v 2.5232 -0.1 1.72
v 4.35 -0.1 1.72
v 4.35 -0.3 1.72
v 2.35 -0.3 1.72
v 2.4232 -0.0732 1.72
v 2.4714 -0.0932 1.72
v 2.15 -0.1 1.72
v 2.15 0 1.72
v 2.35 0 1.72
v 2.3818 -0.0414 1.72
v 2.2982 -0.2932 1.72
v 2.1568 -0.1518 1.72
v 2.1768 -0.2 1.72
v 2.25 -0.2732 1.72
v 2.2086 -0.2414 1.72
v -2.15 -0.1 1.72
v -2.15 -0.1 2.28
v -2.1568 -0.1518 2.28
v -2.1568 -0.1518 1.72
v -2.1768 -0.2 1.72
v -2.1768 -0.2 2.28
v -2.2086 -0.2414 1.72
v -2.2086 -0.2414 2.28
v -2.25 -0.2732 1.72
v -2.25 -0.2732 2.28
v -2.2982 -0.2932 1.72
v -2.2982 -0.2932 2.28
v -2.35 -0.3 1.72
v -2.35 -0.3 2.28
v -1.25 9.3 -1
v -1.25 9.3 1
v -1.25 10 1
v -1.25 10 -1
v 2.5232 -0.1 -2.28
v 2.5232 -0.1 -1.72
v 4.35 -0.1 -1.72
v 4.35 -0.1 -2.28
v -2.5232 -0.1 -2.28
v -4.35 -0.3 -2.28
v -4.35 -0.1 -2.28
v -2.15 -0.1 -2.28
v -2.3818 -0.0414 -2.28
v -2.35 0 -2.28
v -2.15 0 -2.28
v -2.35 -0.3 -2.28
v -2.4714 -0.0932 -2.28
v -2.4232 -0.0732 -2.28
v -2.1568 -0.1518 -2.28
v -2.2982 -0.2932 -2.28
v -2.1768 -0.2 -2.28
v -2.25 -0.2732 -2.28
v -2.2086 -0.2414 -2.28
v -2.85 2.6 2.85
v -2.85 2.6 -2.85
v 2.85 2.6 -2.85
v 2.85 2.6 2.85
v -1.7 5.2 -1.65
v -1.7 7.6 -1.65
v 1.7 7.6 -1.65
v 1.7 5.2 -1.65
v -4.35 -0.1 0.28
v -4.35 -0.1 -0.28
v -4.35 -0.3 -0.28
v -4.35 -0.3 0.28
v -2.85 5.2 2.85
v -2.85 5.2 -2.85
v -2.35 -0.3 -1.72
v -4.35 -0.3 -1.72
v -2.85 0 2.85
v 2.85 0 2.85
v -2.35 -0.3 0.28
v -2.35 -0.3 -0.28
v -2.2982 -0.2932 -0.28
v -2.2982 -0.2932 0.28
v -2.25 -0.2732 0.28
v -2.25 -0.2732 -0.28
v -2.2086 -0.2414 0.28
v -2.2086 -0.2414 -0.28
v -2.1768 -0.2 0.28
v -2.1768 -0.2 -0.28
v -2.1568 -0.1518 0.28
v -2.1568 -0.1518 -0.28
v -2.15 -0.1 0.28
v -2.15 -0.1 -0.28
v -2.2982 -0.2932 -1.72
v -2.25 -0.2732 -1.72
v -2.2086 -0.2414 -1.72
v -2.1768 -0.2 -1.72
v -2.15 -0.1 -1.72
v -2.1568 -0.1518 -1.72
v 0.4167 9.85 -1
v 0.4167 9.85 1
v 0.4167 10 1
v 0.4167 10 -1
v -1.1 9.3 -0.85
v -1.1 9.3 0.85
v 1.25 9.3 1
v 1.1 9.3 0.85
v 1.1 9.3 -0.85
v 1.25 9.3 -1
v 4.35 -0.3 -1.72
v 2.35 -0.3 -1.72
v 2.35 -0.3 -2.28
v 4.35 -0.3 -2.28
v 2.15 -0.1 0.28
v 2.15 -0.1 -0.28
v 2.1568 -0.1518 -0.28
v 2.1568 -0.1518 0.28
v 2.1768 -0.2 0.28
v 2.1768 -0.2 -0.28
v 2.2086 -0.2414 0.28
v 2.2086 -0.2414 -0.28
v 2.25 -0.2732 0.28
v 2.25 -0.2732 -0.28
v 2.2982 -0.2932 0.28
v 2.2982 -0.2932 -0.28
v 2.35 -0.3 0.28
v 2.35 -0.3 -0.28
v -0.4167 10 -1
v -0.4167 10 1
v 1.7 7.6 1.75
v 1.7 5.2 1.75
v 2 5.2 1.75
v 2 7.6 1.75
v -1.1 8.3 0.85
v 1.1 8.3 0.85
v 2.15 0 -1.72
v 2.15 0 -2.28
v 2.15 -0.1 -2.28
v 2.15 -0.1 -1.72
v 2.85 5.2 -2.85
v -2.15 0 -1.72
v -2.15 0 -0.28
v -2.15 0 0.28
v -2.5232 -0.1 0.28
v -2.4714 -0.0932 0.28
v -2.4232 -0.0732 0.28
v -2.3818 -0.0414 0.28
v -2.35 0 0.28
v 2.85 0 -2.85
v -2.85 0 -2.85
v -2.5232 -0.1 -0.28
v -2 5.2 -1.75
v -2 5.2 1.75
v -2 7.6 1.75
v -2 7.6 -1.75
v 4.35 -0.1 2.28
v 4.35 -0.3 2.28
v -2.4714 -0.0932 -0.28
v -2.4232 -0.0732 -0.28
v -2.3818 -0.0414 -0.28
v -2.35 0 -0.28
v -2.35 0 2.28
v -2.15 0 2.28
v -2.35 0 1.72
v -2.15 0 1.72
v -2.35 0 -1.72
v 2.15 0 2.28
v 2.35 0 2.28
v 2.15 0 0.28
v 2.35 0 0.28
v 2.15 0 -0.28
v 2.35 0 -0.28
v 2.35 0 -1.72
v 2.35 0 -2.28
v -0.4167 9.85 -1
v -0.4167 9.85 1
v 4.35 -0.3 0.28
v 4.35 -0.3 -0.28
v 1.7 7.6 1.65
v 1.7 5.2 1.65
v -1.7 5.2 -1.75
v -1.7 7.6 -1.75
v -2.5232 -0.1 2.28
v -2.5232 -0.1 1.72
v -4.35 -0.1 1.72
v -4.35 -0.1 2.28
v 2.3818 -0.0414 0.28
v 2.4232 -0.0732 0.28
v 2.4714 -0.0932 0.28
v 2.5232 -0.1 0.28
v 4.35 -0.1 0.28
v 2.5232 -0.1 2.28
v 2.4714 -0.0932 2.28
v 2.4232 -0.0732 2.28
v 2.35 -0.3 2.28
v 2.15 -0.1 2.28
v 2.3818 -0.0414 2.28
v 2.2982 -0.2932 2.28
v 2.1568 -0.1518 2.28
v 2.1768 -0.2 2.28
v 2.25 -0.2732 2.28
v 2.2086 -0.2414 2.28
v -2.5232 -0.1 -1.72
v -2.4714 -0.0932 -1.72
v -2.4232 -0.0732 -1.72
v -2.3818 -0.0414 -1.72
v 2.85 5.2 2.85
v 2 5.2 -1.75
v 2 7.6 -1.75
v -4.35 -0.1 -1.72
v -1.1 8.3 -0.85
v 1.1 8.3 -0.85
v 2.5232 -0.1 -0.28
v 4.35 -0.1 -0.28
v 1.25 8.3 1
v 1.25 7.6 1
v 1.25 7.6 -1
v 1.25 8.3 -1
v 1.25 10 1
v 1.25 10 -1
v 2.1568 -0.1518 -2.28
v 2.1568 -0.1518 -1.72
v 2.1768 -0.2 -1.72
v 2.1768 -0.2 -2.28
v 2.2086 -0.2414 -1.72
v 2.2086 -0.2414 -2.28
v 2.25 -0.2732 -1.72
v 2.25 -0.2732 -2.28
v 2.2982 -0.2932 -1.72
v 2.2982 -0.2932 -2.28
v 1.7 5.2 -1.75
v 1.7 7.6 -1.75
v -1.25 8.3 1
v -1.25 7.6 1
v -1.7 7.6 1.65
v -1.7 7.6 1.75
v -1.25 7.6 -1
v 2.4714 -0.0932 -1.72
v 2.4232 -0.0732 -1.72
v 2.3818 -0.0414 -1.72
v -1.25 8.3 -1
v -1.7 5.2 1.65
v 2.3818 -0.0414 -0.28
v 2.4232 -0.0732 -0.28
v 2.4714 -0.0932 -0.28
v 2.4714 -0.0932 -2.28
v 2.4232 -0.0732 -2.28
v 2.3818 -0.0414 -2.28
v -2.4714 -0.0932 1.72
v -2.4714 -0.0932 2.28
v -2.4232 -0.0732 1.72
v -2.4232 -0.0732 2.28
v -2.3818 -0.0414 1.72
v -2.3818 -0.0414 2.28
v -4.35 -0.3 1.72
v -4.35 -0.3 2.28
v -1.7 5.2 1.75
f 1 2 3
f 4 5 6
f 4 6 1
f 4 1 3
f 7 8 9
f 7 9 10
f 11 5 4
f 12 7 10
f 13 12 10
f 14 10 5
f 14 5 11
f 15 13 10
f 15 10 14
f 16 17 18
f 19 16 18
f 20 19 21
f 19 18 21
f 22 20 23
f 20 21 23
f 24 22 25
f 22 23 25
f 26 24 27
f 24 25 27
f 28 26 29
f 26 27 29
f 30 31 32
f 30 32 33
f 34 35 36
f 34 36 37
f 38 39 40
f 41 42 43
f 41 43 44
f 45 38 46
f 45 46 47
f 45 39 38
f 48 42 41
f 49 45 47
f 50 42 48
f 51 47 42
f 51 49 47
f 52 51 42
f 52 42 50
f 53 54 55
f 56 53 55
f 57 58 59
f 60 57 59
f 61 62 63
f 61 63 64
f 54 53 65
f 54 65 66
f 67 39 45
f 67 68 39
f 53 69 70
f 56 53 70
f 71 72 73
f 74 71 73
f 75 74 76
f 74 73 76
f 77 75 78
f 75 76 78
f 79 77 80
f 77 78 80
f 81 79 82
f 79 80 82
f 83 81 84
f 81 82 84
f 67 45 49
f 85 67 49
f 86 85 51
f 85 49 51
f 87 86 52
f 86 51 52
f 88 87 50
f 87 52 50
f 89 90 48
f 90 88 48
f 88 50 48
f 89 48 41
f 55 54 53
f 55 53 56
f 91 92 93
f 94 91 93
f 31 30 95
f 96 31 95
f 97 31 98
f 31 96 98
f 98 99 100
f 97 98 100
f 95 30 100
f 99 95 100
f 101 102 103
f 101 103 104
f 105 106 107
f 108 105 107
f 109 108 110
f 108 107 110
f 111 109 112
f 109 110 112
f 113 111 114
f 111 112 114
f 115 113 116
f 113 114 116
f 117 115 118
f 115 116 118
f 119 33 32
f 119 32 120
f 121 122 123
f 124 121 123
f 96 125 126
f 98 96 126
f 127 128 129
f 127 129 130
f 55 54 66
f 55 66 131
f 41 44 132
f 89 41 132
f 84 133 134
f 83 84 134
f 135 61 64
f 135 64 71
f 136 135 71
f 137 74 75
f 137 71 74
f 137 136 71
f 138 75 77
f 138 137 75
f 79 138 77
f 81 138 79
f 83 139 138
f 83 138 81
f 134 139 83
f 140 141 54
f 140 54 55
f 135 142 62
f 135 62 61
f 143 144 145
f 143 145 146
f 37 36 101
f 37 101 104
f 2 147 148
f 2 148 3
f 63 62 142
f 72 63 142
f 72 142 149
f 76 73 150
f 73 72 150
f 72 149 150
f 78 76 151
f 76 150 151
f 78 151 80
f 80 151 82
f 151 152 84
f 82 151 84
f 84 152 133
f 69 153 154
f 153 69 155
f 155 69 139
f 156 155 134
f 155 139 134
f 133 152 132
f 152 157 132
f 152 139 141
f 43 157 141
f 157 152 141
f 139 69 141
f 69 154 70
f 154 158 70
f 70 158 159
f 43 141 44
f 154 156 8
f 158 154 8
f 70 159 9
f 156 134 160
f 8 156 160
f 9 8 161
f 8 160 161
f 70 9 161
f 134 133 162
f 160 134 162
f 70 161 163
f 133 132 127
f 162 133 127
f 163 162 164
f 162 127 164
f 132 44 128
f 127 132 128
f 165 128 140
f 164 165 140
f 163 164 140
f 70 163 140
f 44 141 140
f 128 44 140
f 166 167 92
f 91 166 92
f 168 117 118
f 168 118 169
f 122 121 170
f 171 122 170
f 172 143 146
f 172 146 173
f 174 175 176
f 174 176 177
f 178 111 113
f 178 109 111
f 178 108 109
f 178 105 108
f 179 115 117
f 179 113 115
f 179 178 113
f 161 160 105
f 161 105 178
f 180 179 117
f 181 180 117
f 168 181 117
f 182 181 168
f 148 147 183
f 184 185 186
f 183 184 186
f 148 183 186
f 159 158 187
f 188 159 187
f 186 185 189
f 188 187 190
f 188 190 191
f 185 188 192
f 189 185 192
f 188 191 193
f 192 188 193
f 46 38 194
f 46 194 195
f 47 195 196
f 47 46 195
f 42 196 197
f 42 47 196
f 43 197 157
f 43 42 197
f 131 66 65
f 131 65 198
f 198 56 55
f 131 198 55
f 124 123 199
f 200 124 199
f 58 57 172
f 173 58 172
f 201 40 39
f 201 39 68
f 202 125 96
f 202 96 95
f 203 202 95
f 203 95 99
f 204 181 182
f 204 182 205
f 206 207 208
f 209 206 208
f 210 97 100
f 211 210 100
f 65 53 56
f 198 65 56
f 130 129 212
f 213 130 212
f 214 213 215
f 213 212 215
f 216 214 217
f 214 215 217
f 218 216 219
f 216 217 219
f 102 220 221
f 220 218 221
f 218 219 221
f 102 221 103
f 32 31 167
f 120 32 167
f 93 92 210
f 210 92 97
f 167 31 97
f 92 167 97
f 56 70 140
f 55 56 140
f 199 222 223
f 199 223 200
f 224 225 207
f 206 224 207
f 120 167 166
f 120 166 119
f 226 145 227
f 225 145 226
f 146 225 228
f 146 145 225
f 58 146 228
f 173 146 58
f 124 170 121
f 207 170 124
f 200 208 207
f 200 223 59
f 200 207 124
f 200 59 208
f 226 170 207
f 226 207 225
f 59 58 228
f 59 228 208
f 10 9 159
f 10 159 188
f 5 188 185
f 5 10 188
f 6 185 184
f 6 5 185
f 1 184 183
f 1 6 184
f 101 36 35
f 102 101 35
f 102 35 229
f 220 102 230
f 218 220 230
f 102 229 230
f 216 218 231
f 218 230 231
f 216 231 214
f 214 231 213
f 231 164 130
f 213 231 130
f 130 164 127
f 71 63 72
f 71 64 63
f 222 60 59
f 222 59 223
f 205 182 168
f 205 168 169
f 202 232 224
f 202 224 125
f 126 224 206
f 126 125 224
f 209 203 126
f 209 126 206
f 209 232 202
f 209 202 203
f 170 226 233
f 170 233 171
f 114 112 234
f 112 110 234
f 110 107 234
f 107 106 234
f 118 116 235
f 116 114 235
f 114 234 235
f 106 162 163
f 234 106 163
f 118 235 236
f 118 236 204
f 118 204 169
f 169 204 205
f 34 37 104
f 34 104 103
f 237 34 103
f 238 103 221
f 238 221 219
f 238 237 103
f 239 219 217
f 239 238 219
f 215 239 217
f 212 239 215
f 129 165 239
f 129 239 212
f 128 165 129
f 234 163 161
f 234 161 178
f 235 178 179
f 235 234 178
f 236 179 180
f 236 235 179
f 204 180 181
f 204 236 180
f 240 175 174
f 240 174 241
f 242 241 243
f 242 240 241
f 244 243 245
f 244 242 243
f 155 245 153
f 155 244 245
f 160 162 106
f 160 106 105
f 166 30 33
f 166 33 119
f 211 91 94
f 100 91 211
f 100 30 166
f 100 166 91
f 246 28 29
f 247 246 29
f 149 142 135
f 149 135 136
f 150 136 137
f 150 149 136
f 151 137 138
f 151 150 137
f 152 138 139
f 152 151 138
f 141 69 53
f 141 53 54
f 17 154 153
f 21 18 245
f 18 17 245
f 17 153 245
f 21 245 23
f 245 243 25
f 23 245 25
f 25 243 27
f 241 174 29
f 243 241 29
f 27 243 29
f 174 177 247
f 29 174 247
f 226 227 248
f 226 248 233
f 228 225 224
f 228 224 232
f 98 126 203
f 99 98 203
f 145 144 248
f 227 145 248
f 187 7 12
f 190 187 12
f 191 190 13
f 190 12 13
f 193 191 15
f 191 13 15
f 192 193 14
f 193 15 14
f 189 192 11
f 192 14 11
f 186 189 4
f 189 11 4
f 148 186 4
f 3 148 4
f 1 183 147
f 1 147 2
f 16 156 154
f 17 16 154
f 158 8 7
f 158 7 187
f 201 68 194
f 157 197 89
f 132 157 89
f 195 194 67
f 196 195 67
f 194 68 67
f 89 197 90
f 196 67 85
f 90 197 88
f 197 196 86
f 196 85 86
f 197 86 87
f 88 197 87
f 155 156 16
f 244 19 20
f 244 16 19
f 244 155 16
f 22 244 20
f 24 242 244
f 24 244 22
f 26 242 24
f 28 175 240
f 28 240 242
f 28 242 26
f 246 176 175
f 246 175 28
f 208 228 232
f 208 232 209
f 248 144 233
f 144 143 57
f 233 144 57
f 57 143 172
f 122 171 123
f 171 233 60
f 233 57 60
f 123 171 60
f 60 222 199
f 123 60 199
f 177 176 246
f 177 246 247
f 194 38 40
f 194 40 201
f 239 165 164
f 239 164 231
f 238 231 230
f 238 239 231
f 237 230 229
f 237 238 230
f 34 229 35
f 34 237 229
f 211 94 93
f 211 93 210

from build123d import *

# Parameters (mm, degrees)
SKETCH_1_W                     = 5.7
SKETCH_1_H                     = 5.7
EXTRUDE_1_DEPTH                = 5.2
SPLIT_BODIES_1_SURFACE_1_BACK  = 10.593
SPLIT_BODIES_1_SURFACE_1_DEPTH = 21.186
SPLIT_BODIES_1_SURFACE_2_BACK  = 10.593
SPLIT_BODIES_1_SURFACE_2_DEPTH = 21.186
SKETCH_3_W                     = 4
SKETCH_3_H                     = 3.5
EXTRUDE_2_DEPTH                = 2.4
EXTRUDE_START                  = 2.4
SKETCH_3_3_W                   = 2.5
SKETCH_3_3_H                   = 2
EXTRUDE_3_DEPTH                = 2.4
SKETCH_4_W                     = 0.833333334
SKETCH_4_H                     = 0.3
CUT_EXTRUDE_1_DEPTH            = 12.088056638
SWEEP_START                    = 8.3
SWEEP_1_OUTLINE_W              = 2.5
SWEEP_1_OUTLINE_H              = 2
SWEEP_1_OUTLINE_W_2            = 2.2
SWEEP_1_OUTLINE_H_2            = 1.7
SWEEP_1_DEPTH                  = 1
SKETCH_10_W                    = 3.4
SKETCH_10_H                    = 0.2
CUT_EXTRUDE_2_DEPTH            = 2.4
SKETCH_14_W                    = 0.2
SKETCH_14_H                    = 0.56
EXTRUDE_5_DEPTH                = 0.3
SKETCH_15_W                    = 0.56
SKETCH_15_H                    = 0.2
EXTRUDE_6_DEPTH                = 2
SKETCH_16_W                    = 0.56
SKETCH_16_H                    = 0.2
EXTRUDE_7_DEPTH                = 2
FILLET_1_R                     = 0.2


with BuildPart() as part:
    # Эскиз1 → Бобышка-Вытянуть1 (new body)
    with BuildSketch(Plane(origin=(0, 0, 0), x_dir=(1, 0, 0), z_dir=(0, 1, 0))):
        Rectangle(SKETCH_1_W, SKETCH_1_H)
    extrude(amount=EXTRUDE_1_DEPTH)


with BuildPart() as body_2:
    # Split Bodies 1: the piece behind the surface
    add(part.part)
    # Split Bodies 1 surface: a surface, the sketch's curves swept straight by 21.186 mm
    with BuildLine(Plane.XY.offset(2.85).offset(-SPLIT_BODIES_1_SURFACE_1_BACK), mode=Mode.PRIVATE) as split_bodies_1_surface_1_path:
        Line((-2.85, 2.6), (2.85, 2.6))
    split_bodies_1_surface_1 = Shell.extrude(split_bodies_1_surface_1_path.wire(), (0 * SPLIT_BODIES_1_SURFACE_1_DEPTH, 0 * SPLIT_BODIES_1_SURFACE_1_DEPTH, 1 * SPLIT_BODIES_1_SURFACE_1_DEPTH))
    split(bisect_by=split_bodies_1_surface_1, keep=Keep.BOTTOM)

    # Эскиз14 → Бобышка-Вытянуть5 (add)
    with BuildSketch(Plane.XZ):
        with Locations((-2.25, 0)):
            Rectangle(SKETCH_14_W, SKETCH_14_H)
        with Locations((-2.25, 2)):
            Rectangle(SKETCH_14_W, SKETCH_14_H)
        with Locations((-2.25, -2)):
            Rectangle(SKETCH_14_W, SKETCH_14_H)
        with Locations((2.25, -2)):
            Rectangle(SKETCH_14_W, SKETCH_14_H)
        with Locations((2.25, 2)):
            Rectangle(SKETCH_14_W, SKETCH_14_H)
        with Locations((2.25, 0)):
            Rectangle(SKETCH_14_W, SKETCH_14_H)
    extrude(amount=EXTRUDE_5_DEPTH)

    # Эскиз15 → Бобышка-Вытянуть6 (add)
    with BuildSketch(Plane(origin=(2.35, 0, 0), x_dir=(0, 0, -1), z_dir=(1, 0, 0))):
        with Locations((-2, -0.2)):
            Rectangle(SKETCH_15_W, SKETCH_15_H)
        with Locations((0, -0.2)):
            Rectangle(SKETCH_15_W, SKETCH_15_H)
        with Locations((2, -0.2)):
            Rectangle(SKETCH_15_W, SKETCH_15_H)
    extrude(amount=EXTRUDE_6_DEPTH)

    # Эскиз16 → Бобышка-Вытянуть7 (add)
    with BuildSketch(Plane.ZY.offset(2.35)):
        with Locations((2, -0.2)):
            Rectangle(SKETCH_16_W, SKETCH_16_H)
        with Locations((0, -0.2)):
            Rectangle(SKETCH_16_W, SKETCH_16_H)
        with Locations((-2, -0.2)):
            Rectangle(SKETCH_16_W, SKETCH_16_H)
    extrude(amount=EXTRUDE_7_DEPTH)

    # Скругление1
    # the kernel refuses this fillet: 0.2 mm, written as the material it adds along each edge
    with BuildSketch(Plane(origin=(2.35, -0.1, -2.28), x_dir=(1, 0, 0), z_dir=(0, 0, 1)), Plane(origin=(2.35, -0.1, -0.28), x_dir=(1, 0, 0), z_dir=(0, 0, 1))) as fillet_1_piece_1:
        with BuildLine():
            CenterArc((0.173205081, 0.2), FILLET_1_R, 210, 60)
            Line((0, 0.1), (0, 0))
            Line((0, 0), (0.173205081, 0))
        make_face()
    extrude(amount=0.56)
    with BuildSketch(Plane(origin=(2.35, -0.1, 1.72), x_dir=(0, 1, 0), z_dir=(0, 0, 1))) as fillet_1_piece_2:
        with BuildLine():
            CenterArc((0.2, -0.173205081), FILLET_1_R, 120, 60)
            Line((0, -0.173205081), (0, 0))
            Line((0, 0), (0.1, 0))
        make_face()
    extrude(amount=0.56)
    with BuildSketch(Plane(origin=(-2.35, -0.1, -2.28), x_dir=(-1, 0, 0), z_dir=(0, 0, 1)), Plane(origin=(-2.35, -0.1, -0.28), x_dir=(-1, 0, 0), z_dir=(0, 0, 1))) as fillet_1_piece_3:
        with BuildLine():
            CenterArc((0.173205081, -0.2), FILLET_1_R, 90, 60)
            Line((0, -0.1), (0, 0))
            Line((0, 0), (0.173205081, 0))
        make_face()
    extrude(amount=0.56)
    with BuildSketch(Plane(origin=(-2.35, -0.1, 1.72), x_dir=(0, 1, 0), z_dir=(0, 0, 1))) as fillet_1_piece_4:
        with BuildLine():
            CenterArc((0.2, 0.173205081), FILLET_1_R, 180, 60)
            Line((0, 0.173205081), (0, 0))
            Line((0, 0), (0.1, 0))
        make_face()
    extrude(amount=0.56)
    # the kernel refuses this fillet: 0.2 mm, written as the material it takes off along each edge
    with BuildSketch(Plane(origin=(2.15, -0.3, 1.22), x_dir=(0, 1, 0), z_dir=(0, 0, 1)), Plane(origin=(2.15, -0.3, -0.78), x_dir=(0, 1, 0), z_dir=(0, 0, 1)), Plane(origin=(2.15, -0.3, -2.78), x_dir=(0, 1, 0), z_dir=(0, 0, 1)), Plane(origin=(-2.15, -0.3, 2.78), x_dir=(0, 1, 0), z_dir=(0, 0, -1))) as fillet_1_2_piece_1:
        with BuildLine():
            CenterArc((FILLET_1_R, -FILLET_1_R), FILLET_1_R, 90, 90)
            Line((0, -FILLET_1_R), (0, 0))
            Line((0, 0), (FILLET_1_R, 0))
        make_face()
    extrude(amount=1.56, mode=Mode.SUBTRACT)
    with BuildSketch(Plane(origin=(-2.15, -0.3, -2.78), x_dir=(0, 1, 0), z_dir=(0, 0, 1)), Plane(origin=(-2.15, -0.3, -0.78), x_dir=(0, 1, 0), z_dir=(0, 0, 1))) as fillet_1_2_piece_2:
        with BuildLine():
            CenterArc((FILLET_1_R, FILLET_1_R), FILLET_1_R, 180, 90)
            Line((0, FILLET_1_R), (0, 0))
            Line((0, 0), (FILLET_1_R, 0))
        make_face()
    extrude(amount=1.56, mode=Mode.SUBTRACT)


with BuildPart() as part_1:
    add(part.part)

    # Split Bodies 1: split by a surface, the side it looks to stays
    # Split Bodies 1 surface: a surface, the sketch's curves swept straight by 21.186 mm
    with BuildLine(Plane.XY.offset(2.85).offset(-SPLIT_BODIES_1_SURFACE_2_BACK), mode=Mode.PRIVATE) as split_bodies_1_surface_2_path:
        Line((-2.85, 2.6), (2.85, 2.6))
    split_bodies_1_surface_2 = Shell.extrude(split_bodies_1_surface_2_path.wire(), (0 * SPLIT_BODIES_1_SURFACE_2_DEPTH, 0 * SPLIT_BODIES_1_SURFACE_2_DEPTH, 1 * SPLIT_BODIES_1_SURFACE_2_DEPTH))
    split(bisect_by=split_bodies_1_surface_2, keep=Keep.TOP)


with BuildPart() as body_3:
    # Эскиз3 → Бобышка-Вытянуть2 (new body)
    with BuildSketch(Plane(origin=(0, 5.2, 0), x_dir=(1, 0, 0), z_dir=(0, 1, 0))):
        Rectangle(SKETCH_3_W, SKETCH_3_H)
    extrude(amount=EXTRUDE_2_DEPTH)

    # Эскиз3<3> → Бобышка-Вытянуть3 (add)
    with BuildSketch(Plane(origin=(0, 5.2, 0), x_dir=(1, 0, 0), z_dir=(0, 1, 0)).offset(EXTRUDE_START)):
        Rectangle(SKETCH_3_3_W, SKETCH_3_3_H)
    extrude(amount=EXTRUDE_3_DEPTH)

    # Эскиз4 → Вырез-Вытянуть1 (cut, through all)
    with BuildSketch(Plane.XY.offset(1)):
        with Locations((0, 10)):
            Rectangle(SKETCH_4_W, SKETCH_4_H)
    extrude(amount=-CUT_EXTRUDE_1_DEPTH, mode=Mode.SUBTRACT)

    # Вырез-По траектории1: read off the stored shape, not the designer's step
    # Вырез-По траектории1 outline → Вырез-По траектории1 (cut)
    with BuildSketch(Plane(origin=(0, 0, 0), x_dir=(1, 0, 0), z_dir=(0, 1, 0)).offset(SWEEP_START)):
        Rectangle(SWEEP_1_OUTLINE_W, SWEEP_1_OUTLINE_H)
        Rectangle(SWEEP_1_OUTLINE_W_2, SWEEP_1_OUTLINE_H_2, mode=Mode.SUBTRACT)
    extrude(amount=SWEEP_1_DEPTH, mode=Mode.SUBTRACT)

    # Эскиз10 → Вырез-Вытянуть2 (cut)
    with BuildSketch(Plane(origin=(0, 7.6, 0), x_dir=(1, 0, 0), z_dir=(0, 1, 0))):
        with Locations((0, -1.75)):
            Rectangle(SKETCH_10_W, SKETCH_10_H)
        with Locations((0, 1.75)):
            Rectangle(SKETCH_10_W, SKETCH_10_H)
    extrude(amount=-CUT_EXTRUDE_2_DEPTH, mode=Mode.SUBTRACT)


solid = Compound([body_2.part, part_1.part, body_3.part])
